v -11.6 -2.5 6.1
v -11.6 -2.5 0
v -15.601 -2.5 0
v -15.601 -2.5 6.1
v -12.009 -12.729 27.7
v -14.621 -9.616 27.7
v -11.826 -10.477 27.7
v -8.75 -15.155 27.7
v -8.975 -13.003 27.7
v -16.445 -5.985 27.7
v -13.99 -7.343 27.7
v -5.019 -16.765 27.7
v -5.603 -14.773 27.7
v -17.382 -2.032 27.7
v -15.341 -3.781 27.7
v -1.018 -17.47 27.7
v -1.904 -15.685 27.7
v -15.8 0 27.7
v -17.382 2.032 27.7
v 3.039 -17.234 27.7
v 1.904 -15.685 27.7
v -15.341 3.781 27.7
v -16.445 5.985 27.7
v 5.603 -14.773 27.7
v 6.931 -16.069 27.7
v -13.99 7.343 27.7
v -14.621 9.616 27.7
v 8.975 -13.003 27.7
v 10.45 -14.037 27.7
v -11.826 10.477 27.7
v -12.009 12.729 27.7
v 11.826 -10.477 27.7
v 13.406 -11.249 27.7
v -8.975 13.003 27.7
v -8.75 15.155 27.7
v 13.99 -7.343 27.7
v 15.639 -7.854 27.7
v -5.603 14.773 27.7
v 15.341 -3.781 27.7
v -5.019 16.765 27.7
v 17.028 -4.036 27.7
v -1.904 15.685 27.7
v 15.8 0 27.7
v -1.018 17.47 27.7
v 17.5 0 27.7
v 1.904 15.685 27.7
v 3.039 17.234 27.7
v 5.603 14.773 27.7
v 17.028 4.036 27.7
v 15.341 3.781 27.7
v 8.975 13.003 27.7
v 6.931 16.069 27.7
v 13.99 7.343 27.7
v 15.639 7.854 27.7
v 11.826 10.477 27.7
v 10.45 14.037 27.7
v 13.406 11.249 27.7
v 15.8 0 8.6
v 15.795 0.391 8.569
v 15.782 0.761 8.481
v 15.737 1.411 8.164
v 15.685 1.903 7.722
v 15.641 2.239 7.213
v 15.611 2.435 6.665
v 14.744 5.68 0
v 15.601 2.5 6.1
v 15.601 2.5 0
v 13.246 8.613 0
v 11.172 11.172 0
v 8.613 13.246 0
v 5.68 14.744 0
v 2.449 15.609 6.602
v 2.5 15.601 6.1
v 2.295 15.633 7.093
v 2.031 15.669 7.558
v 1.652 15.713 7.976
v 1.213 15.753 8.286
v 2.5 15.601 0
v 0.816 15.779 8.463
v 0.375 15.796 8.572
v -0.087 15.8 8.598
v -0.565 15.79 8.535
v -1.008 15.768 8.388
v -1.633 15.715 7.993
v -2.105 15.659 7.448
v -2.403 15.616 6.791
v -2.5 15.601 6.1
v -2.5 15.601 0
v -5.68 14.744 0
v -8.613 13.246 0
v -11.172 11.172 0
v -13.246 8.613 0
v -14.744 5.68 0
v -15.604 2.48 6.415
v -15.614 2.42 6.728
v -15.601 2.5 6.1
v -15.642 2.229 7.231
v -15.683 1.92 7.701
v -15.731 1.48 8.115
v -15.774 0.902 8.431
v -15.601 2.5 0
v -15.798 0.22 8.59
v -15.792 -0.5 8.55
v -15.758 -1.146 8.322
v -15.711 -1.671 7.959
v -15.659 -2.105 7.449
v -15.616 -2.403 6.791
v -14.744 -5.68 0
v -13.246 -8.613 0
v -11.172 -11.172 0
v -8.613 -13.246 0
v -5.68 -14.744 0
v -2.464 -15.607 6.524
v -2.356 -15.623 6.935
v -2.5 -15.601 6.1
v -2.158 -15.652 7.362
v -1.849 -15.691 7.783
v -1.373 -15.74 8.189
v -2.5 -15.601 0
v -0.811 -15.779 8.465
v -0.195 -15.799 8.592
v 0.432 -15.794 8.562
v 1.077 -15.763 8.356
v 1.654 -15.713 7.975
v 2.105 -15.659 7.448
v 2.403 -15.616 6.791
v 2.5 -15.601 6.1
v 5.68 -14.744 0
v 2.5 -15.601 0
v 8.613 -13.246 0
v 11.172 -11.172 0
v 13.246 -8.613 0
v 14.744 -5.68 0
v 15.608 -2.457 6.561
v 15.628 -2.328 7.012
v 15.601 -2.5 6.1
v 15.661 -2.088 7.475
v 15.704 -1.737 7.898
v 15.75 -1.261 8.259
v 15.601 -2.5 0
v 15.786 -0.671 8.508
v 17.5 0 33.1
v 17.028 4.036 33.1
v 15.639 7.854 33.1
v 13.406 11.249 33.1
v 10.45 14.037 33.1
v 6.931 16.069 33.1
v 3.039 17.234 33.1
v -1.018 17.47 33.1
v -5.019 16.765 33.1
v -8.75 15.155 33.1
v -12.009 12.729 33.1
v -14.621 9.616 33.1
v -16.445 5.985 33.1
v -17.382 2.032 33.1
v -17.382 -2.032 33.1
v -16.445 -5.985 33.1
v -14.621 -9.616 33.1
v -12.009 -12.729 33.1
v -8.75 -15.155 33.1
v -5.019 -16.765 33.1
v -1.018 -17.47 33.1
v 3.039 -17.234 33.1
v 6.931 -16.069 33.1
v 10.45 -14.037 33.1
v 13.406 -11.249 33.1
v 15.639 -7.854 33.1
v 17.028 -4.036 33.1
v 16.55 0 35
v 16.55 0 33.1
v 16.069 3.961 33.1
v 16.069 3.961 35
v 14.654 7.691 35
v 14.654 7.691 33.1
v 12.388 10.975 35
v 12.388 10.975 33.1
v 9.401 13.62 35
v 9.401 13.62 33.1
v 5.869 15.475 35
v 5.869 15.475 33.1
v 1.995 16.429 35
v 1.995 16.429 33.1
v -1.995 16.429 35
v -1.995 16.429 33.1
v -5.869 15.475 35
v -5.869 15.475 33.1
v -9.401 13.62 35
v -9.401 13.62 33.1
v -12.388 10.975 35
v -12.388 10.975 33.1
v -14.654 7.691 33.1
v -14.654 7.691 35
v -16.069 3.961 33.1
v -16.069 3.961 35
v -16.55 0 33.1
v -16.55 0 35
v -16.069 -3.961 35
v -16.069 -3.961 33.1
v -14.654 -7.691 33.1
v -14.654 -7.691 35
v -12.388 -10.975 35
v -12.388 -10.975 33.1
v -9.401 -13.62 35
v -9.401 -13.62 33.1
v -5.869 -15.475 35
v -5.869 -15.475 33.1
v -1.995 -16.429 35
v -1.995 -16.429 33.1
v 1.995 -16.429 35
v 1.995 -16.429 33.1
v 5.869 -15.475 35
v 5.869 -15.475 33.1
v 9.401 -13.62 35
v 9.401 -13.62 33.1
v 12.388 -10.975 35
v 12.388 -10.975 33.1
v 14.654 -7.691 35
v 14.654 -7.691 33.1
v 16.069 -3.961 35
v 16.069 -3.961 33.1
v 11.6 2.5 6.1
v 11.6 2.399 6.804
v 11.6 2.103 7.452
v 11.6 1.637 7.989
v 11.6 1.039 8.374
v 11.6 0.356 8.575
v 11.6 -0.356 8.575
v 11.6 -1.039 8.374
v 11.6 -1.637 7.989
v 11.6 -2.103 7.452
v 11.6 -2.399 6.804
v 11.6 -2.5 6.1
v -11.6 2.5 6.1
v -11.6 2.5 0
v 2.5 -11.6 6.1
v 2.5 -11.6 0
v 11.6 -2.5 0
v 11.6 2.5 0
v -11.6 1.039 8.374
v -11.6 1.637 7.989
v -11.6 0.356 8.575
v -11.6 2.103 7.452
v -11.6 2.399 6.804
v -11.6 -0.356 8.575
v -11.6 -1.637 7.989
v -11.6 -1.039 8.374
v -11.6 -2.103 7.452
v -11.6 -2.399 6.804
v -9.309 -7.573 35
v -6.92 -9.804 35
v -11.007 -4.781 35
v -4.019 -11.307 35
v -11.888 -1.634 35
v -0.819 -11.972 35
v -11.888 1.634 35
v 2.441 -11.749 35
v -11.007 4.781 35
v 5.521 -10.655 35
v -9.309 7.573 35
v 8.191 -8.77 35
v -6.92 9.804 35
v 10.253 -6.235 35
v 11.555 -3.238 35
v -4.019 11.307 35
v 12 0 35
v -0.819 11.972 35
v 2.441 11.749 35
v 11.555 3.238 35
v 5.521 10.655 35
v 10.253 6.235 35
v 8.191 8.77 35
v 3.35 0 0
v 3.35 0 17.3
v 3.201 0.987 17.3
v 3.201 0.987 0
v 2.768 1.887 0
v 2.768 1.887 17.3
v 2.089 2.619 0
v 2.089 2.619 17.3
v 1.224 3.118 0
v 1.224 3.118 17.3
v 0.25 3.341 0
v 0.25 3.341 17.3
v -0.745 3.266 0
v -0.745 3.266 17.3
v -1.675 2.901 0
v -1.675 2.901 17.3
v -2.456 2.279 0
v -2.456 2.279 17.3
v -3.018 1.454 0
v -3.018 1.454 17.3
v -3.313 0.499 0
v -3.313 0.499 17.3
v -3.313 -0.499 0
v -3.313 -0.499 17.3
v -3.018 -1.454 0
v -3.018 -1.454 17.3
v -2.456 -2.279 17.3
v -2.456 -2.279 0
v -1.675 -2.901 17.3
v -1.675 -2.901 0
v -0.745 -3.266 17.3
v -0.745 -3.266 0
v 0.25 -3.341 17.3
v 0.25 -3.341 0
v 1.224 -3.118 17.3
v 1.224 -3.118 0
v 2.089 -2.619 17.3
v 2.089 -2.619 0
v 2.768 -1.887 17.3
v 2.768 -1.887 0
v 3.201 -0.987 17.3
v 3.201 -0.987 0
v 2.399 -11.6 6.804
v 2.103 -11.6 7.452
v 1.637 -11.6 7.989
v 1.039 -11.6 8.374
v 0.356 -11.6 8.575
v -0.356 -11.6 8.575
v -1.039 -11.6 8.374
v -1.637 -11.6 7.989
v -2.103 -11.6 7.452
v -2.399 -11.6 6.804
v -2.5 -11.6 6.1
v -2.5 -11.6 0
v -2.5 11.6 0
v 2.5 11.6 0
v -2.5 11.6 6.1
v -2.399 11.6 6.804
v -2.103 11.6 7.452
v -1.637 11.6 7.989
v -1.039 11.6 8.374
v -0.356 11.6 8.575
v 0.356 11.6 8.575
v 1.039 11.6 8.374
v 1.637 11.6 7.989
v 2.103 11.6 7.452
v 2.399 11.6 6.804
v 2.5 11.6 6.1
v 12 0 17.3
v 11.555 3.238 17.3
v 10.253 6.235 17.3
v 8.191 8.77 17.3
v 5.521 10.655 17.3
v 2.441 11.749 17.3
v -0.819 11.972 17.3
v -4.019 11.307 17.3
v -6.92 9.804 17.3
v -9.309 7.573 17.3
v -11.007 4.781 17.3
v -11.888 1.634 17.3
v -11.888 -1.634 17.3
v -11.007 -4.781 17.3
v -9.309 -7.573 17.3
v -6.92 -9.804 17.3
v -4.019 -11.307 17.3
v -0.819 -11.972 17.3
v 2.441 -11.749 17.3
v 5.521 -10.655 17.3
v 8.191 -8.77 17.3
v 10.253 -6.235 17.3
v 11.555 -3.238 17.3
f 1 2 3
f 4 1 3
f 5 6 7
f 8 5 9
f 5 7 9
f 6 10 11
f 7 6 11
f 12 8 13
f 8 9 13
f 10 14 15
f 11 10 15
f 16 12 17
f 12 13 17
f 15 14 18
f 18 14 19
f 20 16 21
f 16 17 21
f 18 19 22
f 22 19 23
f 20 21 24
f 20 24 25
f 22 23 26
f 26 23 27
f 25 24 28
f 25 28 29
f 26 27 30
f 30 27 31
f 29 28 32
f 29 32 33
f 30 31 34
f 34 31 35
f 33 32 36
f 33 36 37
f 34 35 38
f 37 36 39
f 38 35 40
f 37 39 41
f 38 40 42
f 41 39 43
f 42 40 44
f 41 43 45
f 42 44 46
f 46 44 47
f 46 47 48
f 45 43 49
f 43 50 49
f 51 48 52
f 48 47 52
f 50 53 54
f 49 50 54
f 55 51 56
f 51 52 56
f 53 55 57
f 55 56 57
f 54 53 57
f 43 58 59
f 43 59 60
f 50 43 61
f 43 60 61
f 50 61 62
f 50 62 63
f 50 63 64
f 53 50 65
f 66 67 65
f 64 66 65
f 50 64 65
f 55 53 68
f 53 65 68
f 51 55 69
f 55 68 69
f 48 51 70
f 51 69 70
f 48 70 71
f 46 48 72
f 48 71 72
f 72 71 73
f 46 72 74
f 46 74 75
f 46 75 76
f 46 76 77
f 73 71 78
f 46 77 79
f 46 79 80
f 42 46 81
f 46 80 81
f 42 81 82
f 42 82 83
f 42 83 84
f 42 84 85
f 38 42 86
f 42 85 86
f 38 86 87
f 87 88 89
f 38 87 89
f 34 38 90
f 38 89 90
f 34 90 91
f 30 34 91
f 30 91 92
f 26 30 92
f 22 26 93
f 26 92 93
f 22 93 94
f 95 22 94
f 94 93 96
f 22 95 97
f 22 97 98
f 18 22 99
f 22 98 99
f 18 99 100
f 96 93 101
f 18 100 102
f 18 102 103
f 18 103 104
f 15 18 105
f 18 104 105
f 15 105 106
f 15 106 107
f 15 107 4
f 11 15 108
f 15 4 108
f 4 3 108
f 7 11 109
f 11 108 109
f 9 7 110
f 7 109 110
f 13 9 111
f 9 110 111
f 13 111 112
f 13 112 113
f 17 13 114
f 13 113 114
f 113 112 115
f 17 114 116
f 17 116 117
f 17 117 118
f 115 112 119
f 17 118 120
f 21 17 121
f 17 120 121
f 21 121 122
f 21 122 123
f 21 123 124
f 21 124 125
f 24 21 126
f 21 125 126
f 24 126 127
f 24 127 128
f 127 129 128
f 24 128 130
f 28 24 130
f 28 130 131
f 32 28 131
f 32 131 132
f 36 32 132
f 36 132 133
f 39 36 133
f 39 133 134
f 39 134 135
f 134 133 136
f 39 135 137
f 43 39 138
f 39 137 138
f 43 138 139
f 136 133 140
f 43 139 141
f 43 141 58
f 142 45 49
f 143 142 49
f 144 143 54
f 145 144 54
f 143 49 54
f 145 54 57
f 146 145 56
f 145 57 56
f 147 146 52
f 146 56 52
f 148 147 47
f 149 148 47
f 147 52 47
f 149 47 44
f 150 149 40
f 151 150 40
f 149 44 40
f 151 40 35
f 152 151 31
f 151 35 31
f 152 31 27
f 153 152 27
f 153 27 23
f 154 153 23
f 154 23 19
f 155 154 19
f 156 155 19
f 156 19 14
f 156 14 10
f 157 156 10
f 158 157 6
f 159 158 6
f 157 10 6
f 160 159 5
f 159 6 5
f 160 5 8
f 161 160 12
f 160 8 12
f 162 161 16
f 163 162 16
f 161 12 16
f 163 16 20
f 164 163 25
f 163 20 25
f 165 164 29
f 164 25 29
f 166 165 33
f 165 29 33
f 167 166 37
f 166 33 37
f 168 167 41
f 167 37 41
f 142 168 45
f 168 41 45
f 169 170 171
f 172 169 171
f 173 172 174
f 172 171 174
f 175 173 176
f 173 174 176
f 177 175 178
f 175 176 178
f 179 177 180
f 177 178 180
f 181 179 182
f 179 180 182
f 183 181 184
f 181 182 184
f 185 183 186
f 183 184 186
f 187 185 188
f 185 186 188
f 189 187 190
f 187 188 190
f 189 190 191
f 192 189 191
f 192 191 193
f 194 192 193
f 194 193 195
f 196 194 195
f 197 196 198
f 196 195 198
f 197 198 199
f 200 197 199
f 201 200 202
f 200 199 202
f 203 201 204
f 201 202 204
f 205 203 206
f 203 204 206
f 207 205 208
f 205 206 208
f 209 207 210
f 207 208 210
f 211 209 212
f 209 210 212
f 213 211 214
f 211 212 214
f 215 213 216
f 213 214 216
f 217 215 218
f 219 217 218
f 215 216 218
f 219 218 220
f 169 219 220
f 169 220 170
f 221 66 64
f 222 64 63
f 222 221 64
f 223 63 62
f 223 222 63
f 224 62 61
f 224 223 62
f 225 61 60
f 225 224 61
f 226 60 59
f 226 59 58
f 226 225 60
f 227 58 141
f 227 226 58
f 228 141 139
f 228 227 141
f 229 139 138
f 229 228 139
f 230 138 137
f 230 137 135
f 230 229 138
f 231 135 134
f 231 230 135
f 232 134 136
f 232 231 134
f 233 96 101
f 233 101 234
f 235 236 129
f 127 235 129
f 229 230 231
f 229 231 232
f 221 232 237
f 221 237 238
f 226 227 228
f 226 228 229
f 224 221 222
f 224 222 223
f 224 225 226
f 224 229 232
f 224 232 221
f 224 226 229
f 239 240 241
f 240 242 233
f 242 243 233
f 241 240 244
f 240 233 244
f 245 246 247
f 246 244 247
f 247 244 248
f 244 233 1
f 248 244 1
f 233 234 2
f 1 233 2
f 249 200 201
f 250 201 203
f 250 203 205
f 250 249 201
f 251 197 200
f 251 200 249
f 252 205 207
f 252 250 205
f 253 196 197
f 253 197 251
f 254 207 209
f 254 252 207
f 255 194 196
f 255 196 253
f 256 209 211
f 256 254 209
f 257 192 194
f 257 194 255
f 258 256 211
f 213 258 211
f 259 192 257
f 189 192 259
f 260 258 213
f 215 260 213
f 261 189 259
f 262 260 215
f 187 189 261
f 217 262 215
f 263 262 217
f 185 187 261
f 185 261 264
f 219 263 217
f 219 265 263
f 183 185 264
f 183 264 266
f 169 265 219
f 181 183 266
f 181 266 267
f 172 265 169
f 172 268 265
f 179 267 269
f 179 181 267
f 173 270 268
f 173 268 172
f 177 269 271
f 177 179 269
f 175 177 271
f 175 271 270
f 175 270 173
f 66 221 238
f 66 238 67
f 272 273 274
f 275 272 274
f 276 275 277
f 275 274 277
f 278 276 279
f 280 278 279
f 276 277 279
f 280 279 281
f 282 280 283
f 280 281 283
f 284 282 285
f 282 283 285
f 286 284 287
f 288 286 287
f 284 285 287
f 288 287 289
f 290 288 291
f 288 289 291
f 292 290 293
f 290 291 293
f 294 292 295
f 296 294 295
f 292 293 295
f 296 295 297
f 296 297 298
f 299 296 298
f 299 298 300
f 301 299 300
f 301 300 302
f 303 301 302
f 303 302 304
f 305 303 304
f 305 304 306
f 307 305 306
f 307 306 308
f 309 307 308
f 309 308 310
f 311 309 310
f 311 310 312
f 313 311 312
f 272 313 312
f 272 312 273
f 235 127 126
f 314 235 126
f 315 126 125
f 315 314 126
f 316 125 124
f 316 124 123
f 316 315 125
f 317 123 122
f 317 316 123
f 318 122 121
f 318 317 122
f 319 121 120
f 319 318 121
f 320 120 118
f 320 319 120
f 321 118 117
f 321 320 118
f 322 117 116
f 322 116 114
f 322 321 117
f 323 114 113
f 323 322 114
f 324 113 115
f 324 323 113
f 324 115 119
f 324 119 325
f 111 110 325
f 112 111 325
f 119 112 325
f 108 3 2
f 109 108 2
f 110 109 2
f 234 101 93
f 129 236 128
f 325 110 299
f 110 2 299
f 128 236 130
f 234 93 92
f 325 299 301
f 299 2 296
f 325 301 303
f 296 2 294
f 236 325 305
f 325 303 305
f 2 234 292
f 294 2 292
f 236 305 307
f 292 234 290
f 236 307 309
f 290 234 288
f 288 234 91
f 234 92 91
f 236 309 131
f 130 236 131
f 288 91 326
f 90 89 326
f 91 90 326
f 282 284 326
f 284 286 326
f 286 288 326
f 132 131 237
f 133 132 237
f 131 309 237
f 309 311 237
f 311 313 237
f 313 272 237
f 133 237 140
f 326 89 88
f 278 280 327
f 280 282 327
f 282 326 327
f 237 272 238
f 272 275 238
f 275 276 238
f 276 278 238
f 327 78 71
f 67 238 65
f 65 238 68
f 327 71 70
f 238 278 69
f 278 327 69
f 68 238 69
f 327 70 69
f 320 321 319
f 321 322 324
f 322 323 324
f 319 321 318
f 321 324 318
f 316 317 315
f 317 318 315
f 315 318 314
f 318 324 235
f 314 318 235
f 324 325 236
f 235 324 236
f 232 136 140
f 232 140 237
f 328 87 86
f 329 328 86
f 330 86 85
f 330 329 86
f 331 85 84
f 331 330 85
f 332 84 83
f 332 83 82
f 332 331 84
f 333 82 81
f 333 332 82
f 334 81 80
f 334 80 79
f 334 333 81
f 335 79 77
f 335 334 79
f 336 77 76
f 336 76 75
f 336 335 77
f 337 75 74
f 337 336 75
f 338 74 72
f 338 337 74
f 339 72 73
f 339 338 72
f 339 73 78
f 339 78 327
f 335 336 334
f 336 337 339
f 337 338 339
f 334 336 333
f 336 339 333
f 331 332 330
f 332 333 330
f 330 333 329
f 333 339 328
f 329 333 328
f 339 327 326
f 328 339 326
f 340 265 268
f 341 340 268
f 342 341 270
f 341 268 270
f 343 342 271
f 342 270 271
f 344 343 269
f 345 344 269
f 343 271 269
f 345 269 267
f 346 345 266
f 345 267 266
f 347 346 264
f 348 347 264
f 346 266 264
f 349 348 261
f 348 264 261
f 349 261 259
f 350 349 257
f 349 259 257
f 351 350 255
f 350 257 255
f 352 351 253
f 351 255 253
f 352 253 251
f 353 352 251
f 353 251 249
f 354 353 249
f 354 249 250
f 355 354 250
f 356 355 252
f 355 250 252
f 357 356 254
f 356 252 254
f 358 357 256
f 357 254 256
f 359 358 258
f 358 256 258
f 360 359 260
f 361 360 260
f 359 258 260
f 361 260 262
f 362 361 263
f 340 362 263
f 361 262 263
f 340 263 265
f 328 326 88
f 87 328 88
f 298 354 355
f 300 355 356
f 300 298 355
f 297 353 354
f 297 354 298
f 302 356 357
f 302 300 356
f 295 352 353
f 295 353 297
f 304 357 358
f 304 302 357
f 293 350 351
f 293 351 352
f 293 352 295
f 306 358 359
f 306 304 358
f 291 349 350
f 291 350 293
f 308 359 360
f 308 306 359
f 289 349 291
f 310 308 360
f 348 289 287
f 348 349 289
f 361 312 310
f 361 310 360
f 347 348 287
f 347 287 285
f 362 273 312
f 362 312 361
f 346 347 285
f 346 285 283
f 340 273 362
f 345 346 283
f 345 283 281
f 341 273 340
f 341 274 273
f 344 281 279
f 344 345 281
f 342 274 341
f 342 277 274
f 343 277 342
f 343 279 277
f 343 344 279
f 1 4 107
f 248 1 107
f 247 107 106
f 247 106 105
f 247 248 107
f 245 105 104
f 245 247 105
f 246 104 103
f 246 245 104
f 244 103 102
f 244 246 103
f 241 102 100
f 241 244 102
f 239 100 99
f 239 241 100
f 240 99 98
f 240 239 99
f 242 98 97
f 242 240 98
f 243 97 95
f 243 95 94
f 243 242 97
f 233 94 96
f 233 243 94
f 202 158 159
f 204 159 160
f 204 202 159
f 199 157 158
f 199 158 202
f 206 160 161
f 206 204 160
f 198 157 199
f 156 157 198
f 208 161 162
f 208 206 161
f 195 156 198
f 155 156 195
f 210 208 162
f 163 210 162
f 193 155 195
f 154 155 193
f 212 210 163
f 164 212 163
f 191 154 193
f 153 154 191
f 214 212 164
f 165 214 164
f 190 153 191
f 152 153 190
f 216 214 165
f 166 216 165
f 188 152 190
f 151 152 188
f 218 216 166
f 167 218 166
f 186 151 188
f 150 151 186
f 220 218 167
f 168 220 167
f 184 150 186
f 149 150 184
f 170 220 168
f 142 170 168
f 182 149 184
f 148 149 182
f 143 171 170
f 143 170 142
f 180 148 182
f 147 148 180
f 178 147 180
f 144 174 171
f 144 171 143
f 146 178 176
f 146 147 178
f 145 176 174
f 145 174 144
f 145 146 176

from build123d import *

# Parameters (mm, degrees)
F0_R      = 15.8
F1_DEPTH  = 27.7
F2_R      = 17.5
F2_R_2    = 15.8
F3_DEPTH  = 5.4
F4_R      = 16.55
F5_DEPTH  = 1.9
F7_DEPTH  = 6.1
F8_DEPTH  = 6.1
F9_R      = 2.5
F10_DEPTH = 25
F11_DEPTH = 6.1
F12_R     = 2.5
F13_DEPTH = 25
F15_DEPTH = 25
F16_R     = 2.5
F17_DEPTH = 25
F18_R     = 12
F19_DEPTH = 17.7
F20_R     = 3.35
F21_DEPTH = 33.4


with BuildPart() as f1:
    # F0 (on Top) → F1 (new body)
    with BuildSketch(Plane.XY):
        Circle(F0_R)
    extrude(amount=F1_DEPTH)

    # F2 (on face) → F3 (join)
    with BuildSketch(Plane.XY.offset(27.7)):
        Circle(F2_R)
        Circle(F2_R_2, mode=Mode.SUBTRACT)
        Circle(F2_R_2)
    extrude(amount=F3_DEPTH)

    # F4 (on face) → F5 (join)
    with BuildSketch(Plane.XY.offset(33.1)):
        Circle(F4_R)
    extrude(amount=F5_DEPTH)

    # F6 (on face) → F7 (join)
    with BuildSketch(Plane(origin=(0, 0, 0), x_dir=(1, 0, 0), z_dir=(0, 0, -1))):
        with BuildLine():
            Line((15.6009615088, 2.5), (11.6, 2.5))
            Line((11.6, 2.5), (11.6, -2.5))
            Line((11.6, -2.5), (15.6009615088, -2.5))
            ThreePointArc((15.6009615088, -2.5), (15.7501617744, -1.2539553741), (15.8, 0))
            ThreePointArc((15.8, 0), (15.7501617744, 1.2539553741), (15.6009615088, 2.5))
        make_face()
    extrude(amount=-F7_DEPTH)

    # F6 (on face) → F8 (cut)
    with BuildSketch(Plane(origin=(0, 0, 0), x_dir=(1, 0, 0), z_dir=(0, 0, -1))):
        with BuildLine():
            Line((-2.5, 15.6009615088), (-2.5, 11.6))
            Line((-2.5, 11.6), (2.5, 11.6))
            Line((2.5, 11.6), (2.5, 15.6009615088))
            ThreePointArc((2.5, 15.6009615088), (0, 15.8), (-2.5, 15.6009615088))
        make_face()
    extrude(amount=-F8_DEPTH, mode=Mode.SUBTRACT)

    # F9 (on face) → F10 (cut)
    with BuildSketch(Plane.XZ.offset(11.6)):
        with BuildLine():
            Line((2.5, 0), (2.5, 6.1))
            ThreePointArc((2.5, 6.1), (0, 3.6), (-2.5, 6.1))
            Line((-2.5, 6.1), (-2.5, 0))
            Line((-2.5, 0), (2.5, 0))
        make_face()
        with Locations((0, 6.1)):
            Circle(F9_R)
    extrude(amount=F10_DEPTH, mode=Mode.SUBTRACT)

    # F6 (on face) → F11 (cut)
    with BuildSketch(Plane(origin=(0, 0, 0), x_dir=(1, 0, 0), z_dir=(0, 0, -1))):
        with BuildLine():
            Line((-11.6, -2.5), (-11.6, 2.5))
            Line((-11.6, 2.5), (-15.6009615088, 2.5))
            ThreePointArc((-15.6009615088, 2.5), (-15.8, 0), (-15.6009615088, -2.5))
            Line((-15.6009615088, -2.5), (-11.6, -2.5))
        make_face()
        with BuildLine():
            Line((2.5, -11.6), (-2.5, -11.6))
            Line((-2.5, -11.6), (-2.5, -15.6009615088))
            ThreePointArc((-2.5, -15.6009615088), (0, -15.8), (2.5, -15.6009615088))
            Line((2.5, -15.6009615088), (2.5, -11.6))
        make_face()
        with BuildLine():
            Line((15.6009615088, 2.5), (11.6, 2.5))
            Line((11.6, 2.5), (11.6, -2.5))
            Line((11.6, -2.5), (15.6009615088, -2.5))
            ThreePointArc((15.6009615088, -2.5), (15.7501617744, -1.2539553741), (15.8, 0))
            ThreePointArc((15.8, 0), (15.7501617744, 1.2539553741), (15.6009615088, 2.5))
        make_face()
    extrude(amount=-F11_DEPTH, mode=Mode.SUBTRACT)

    # F12 (on face) → F13 (cut)
    with BuildSketch(Plane(origin=(-11.6, 0, 0), x_dir=(0, -1, 0), z_dir=(-1, 0, 0))):
        with Locations((0, 6.1)):
            Circle(F12_R)
    extrude(amount=F13_DEPTH, mode=Mode.SUBTRACT)

    # F14 (on face) → F15 (cut)
    with BuildSketch(Plane(origin=(0, 11.6, 0), x_dir=(-1, 0, 0), z_dir=(0, 1, 0))):
        with BuildLine():
            Line((-2.5, 6.1), (2.5, 6.1))
            ThreePointArc((2.5, 6.1), (0, 8.6), (-2.5, 6.1))
        make_face()
    extrude(amount=F15_DEPTH, mode=Mode.SUBTRACT)

    # F16 (on face) → F17 (cut)
    with BuildSketch(Plane.YZ.offset(11.6)):
        with Locations((0, 6.1)):
            Circle(F16_R)
    extrude(amount=F17_DEPTH, mode=Mode.SUBTRACT)

    # F18 (on face) → F19 (cut)
    with BuildSketch(Plane.XY.offset(35)):
        Circle(F18_R)
    extrude(amount=-F19_DEPTH, mode=Mode.SUBTRACT)

    # F20 (on face) → F21 (cut)
    with BuildSketch(Plane.XY.offset(17.3)):
        Circle(F20_R)
    extrude(amount=-F21_DEPTH, mode=Mode.SUBTRACT)


solid = f1.part
